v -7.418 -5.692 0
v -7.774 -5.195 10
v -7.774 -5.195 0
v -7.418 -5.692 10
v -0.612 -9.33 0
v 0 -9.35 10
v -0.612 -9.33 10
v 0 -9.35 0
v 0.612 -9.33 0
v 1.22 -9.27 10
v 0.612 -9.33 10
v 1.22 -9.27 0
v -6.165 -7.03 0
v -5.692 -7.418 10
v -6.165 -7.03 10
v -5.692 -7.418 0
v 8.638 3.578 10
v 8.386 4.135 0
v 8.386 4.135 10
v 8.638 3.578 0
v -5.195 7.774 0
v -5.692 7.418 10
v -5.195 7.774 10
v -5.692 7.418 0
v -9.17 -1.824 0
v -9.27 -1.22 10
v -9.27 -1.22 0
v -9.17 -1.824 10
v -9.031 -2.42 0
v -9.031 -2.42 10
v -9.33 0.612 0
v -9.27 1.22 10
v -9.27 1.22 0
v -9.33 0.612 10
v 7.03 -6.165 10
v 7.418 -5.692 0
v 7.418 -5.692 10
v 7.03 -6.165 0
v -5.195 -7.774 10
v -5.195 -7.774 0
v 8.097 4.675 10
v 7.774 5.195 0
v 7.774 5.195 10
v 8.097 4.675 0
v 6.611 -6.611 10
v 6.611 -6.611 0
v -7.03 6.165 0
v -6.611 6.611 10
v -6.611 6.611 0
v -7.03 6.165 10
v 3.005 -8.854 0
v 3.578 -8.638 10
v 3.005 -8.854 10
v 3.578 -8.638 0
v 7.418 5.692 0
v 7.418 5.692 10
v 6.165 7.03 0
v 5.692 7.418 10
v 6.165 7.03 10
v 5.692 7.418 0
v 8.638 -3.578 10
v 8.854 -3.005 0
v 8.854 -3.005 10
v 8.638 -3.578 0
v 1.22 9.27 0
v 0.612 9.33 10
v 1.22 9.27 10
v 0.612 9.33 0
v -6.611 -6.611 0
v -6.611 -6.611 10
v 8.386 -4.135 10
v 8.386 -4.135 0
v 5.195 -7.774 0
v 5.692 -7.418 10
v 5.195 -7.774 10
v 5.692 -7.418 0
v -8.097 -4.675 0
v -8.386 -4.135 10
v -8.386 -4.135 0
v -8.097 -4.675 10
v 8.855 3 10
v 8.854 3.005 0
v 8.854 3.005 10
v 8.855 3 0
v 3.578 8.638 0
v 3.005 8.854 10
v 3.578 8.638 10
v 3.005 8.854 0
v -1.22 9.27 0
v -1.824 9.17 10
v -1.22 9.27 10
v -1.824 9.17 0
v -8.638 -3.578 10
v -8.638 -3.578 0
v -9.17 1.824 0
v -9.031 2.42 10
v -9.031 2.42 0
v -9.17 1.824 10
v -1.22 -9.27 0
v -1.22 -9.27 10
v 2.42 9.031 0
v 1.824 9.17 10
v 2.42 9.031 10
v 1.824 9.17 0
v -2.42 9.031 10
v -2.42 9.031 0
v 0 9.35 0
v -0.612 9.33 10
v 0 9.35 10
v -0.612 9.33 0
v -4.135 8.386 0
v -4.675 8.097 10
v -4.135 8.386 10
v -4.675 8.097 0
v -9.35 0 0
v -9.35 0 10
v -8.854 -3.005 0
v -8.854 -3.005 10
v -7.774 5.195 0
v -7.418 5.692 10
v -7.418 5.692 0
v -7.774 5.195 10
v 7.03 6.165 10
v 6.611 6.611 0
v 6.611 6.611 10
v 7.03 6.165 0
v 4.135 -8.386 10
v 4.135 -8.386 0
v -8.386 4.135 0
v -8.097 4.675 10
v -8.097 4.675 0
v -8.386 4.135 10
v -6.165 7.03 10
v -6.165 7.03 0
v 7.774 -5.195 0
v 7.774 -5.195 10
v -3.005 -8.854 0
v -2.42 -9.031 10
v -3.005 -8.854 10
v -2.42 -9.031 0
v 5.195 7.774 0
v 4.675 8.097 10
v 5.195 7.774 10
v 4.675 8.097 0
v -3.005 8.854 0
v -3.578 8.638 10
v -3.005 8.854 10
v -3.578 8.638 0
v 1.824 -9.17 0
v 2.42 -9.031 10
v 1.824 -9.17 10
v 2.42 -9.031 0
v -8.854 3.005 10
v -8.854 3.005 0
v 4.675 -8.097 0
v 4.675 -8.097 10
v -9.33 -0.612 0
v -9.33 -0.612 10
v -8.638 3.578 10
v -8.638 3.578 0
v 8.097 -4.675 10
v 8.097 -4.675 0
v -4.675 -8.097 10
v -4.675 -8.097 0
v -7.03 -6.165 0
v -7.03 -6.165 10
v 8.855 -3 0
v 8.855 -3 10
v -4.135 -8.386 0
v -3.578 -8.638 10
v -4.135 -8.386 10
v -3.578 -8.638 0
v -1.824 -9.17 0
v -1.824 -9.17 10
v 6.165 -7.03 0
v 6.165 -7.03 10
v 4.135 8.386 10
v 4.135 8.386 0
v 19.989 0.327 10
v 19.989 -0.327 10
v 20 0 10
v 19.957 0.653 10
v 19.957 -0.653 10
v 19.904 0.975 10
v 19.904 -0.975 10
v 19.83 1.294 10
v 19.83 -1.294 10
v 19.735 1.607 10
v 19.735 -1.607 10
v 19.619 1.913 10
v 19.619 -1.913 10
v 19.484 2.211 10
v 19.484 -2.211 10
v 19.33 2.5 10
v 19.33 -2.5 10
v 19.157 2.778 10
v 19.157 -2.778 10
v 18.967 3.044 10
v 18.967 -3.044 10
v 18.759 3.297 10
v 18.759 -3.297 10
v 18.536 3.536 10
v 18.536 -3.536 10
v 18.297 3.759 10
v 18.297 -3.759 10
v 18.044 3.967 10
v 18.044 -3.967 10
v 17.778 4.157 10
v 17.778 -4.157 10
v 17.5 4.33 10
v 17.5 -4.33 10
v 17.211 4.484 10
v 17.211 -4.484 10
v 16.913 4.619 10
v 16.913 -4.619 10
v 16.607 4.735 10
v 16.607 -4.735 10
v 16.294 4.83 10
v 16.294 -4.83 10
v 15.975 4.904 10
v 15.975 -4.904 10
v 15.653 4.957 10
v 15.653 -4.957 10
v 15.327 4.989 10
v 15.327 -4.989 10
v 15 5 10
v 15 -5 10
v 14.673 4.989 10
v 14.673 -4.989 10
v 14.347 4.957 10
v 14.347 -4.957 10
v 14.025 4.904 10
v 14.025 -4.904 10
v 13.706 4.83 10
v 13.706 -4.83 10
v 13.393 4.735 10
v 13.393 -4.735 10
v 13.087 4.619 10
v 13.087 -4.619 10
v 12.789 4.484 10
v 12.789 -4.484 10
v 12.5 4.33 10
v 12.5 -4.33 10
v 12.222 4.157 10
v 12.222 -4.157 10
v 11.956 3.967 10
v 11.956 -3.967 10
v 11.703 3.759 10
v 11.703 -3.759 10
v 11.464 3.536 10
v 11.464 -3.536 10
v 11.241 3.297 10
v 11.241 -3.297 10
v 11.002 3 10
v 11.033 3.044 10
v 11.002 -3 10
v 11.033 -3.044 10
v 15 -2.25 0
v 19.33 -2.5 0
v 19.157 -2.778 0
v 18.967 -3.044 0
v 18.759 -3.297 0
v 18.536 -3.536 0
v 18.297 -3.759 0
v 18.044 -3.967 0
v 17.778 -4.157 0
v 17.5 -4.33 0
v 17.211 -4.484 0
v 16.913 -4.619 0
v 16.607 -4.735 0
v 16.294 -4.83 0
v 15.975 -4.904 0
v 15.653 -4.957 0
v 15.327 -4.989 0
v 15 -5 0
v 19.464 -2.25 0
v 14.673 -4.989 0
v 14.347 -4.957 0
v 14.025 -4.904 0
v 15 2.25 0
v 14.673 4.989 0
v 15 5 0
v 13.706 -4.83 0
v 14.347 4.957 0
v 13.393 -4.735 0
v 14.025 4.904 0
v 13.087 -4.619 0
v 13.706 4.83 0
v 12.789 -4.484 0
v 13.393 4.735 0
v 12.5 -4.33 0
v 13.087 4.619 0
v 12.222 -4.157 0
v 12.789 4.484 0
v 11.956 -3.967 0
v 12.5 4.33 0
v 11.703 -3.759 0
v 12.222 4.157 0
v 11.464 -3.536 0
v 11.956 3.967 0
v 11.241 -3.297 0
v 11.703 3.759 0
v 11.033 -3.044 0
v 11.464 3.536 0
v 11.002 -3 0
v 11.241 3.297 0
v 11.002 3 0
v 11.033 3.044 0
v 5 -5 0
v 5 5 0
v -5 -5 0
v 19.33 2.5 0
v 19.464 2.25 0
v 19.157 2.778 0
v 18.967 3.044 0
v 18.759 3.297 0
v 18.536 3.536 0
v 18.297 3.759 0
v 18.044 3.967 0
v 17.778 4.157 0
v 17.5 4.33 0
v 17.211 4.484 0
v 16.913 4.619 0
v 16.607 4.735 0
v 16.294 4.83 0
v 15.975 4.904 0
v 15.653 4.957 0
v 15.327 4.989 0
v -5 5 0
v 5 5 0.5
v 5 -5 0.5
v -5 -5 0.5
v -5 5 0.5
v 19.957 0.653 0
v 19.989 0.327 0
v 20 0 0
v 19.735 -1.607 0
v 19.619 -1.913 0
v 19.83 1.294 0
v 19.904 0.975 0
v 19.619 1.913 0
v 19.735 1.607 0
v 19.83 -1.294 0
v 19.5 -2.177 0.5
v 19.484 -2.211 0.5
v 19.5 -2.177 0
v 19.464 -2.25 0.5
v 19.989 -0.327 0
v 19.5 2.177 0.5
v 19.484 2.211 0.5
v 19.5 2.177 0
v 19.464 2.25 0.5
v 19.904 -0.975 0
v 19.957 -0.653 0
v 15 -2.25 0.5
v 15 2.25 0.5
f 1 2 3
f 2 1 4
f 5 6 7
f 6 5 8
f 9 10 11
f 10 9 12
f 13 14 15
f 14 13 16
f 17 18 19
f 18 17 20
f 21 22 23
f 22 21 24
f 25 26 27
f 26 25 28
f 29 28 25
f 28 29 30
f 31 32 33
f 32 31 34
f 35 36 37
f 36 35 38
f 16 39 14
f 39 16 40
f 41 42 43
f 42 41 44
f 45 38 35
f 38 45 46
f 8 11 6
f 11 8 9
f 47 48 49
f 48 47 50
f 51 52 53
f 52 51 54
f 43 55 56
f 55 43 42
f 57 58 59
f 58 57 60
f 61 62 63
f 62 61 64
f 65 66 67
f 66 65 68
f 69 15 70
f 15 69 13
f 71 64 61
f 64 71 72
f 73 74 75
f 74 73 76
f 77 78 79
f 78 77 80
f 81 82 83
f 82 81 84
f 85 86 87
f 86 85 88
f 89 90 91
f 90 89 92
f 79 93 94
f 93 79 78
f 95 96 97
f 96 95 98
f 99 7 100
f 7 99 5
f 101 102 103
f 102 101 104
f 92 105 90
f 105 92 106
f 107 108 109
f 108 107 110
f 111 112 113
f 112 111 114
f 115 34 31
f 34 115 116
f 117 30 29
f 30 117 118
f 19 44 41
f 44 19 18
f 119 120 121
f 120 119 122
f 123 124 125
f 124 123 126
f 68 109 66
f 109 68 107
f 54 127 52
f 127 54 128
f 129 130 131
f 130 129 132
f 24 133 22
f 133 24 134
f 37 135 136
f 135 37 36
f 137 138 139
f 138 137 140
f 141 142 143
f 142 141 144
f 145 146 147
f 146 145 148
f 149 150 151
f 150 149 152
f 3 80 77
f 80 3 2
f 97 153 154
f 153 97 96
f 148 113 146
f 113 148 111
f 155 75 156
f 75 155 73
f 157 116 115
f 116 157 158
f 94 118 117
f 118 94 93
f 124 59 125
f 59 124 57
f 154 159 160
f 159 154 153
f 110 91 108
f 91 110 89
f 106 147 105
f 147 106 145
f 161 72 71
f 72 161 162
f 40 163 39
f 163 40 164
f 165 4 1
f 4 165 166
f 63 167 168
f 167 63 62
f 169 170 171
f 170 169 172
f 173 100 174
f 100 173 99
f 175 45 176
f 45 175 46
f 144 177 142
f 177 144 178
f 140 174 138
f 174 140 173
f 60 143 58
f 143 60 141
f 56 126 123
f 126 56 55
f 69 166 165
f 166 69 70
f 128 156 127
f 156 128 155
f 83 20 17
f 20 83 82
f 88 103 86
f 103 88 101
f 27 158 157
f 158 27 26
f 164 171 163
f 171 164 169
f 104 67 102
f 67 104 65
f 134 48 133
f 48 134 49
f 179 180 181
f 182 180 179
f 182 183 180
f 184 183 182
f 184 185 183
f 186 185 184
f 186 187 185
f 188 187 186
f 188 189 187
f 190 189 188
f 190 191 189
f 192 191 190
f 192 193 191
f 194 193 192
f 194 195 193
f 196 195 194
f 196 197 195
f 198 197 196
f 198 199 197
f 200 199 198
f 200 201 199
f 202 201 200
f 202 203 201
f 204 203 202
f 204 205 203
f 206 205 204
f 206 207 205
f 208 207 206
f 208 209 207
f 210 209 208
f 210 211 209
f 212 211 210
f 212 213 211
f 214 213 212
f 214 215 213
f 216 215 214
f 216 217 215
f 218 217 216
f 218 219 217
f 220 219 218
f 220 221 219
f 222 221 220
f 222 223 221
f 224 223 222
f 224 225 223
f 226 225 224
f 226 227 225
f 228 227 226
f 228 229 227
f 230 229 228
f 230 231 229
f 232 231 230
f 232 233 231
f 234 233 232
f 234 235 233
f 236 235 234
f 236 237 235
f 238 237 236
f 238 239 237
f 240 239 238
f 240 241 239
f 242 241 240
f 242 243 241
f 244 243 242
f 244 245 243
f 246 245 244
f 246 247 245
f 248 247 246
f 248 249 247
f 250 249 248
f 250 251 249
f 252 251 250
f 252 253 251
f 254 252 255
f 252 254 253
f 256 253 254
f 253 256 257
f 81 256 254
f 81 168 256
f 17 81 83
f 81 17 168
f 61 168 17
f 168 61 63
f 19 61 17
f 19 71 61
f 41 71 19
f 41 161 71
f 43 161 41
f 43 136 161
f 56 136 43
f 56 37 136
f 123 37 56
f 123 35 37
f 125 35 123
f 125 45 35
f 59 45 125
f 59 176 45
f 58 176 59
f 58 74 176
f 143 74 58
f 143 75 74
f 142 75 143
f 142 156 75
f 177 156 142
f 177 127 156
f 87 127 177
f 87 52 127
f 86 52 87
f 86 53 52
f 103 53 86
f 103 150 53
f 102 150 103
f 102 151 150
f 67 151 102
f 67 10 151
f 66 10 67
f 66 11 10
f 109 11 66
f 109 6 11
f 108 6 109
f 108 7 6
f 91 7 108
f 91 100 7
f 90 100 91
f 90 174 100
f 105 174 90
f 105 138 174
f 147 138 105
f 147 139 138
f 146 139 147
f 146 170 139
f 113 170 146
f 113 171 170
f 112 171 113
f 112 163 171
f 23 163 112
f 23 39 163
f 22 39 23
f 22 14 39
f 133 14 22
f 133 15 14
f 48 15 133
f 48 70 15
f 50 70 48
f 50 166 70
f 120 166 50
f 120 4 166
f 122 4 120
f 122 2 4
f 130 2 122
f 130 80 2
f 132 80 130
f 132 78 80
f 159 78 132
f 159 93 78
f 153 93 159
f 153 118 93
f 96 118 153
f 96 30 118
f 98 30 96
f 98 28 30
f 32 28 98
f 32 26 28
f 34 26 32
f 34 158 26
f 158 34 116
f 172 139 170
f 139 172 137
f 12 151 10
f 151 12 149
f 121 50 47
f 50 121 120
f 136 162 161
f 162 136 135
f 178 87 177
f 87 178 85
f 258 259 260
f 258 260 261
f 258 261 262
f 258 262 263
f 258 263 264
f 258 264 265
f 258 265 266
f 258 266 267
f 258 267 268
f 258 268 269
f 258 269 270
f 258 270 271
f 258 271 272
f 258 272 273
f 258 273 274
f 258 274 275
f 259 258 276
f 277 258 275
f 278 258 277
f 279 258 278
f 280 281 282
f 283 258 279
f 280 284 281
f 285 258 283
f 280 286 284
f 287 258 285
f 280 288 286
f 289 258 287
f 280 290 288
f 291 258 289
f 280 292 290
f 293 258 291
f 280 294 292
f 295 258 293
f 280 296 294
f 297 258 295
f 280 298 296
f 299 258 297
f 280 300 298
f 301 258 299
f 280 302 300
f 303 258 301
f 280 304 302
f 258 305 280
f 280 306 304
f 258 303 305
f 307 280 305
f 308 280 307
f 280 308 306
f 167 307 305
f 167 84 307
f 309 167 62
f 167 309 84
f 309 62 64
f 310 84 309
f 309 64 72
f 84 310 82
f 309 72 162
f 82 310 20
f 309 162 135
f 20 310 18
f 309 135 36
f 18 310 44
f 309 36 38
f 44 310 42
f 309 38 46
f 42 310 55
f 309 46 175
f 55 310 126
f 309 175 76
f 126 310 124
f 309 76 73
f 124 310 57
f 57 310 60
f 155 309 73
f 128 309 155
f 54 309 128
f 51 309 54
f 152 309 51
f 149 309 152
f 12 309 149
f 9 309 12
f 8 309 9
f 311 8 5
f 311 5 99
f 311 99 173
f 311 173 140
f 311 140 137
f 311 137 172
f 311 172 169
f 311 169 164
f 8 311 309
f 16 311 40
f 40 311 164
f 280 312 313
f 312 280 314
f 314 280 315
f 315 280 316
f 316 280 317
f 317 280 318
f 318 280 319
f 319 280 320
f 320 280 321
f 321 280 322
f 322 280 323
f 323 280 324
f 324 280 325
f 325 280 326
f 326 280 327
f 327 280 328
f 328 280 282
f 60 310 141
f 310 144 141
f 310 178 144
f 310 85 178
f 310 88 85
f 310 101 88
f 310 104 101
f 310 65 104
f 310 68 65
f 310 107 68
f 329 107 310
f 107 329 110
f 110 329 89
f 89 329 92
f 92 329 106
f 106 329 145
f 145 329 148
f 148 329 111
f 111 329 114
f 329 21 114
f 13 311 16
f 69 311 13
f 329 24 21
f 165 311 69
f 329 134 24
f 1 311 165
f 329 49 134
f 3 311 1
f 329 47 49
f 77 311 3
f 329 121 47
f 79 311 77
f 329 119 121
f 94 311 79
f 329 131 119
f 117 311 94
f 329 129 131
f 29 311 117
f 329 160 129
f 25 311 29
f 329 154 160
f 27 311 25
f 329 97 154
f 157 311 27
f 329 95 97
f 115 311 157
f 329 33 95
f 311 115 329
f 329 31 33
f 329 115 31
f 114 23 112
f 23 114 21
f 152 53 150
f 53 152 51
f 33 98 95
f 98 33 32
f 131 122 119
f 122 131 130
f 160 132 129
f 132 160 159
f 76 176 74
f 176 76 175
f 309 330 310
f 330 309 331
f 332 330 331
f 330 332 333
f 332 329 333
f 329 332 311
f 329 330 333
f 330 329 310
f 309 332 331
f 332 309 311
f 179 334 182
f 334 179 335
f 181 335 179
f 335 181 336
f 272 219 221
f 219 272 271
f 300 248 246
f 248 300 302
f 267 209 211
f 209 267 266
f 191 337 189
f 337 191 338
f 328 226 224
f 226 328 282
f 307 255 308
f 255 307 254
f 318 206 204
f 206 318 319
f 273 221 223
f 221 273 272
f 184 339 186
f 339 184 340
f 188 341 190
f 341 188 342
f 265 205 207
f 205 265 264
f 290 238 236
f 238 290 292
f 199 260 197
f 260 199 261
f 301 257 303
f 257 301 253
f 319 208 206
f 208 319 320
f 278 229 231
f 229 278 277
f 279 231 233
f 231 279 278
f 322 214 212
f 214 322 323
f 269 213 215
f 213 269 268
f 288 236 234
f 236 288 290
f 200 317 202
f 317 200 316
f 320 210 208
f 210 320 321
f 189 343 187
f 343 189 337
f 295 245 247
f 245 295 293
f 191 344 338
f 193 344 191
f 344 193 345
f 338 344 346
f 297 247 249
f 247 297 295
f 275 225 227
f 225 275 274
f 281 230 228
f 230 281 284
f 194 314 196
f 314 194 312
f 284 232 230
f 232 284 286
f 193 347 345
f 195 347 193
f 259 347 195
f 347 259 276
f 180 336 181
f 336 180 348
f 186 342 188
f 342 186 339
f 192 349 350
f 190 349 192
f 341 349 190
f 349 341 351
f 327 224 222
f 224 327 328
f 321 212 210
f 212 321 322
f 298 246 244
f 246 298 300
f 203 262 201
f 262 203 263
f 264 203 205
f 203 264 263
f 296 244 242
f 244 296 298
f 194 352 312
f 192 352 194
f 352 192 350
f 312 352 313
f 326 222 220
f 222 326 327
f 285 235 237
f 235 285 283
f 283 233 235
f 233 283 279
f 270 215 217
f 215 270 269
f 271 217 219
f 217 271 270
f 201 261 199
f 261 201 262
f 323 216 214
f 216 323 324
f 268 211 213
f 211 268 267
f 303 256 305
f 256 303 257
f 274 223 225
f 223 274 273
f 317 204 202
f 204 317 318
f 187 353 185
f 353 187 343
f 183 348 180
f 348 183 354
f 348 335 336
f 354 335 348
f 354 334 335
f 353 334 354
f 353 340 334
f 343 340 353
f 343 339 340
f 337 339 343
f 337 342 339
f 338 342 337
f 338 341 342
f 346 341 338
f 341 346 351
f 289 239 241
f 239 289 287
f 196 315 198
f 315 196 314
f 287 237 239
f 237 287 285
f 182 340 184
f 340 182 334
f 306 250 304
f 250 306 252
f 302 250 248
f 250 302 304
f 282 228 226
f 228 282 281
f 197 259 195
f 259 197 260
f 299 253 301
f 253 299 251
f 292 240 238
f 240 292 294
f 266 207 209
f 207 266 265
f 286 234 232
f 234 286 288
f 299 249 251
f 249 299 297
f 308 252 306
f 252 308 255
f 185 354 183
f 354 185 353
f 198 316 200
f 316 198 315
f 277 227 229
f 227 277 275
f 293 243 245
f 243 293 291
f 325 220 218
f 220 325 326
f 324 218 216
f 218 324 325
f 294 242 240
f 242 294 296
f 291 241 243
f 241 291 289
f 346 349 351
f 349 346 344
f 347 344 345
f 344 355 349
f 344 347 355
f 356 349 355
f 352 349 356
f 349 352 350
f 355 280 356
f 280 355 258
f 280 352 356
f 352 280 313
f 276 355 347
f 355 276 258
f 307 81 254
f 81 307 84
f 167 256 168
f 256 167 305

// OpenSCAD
// Snap-on tubing clip for 12.7 mm lab stand rod
// Print orientation: flat on bed, extrusion along +Z

// ---------- Parameters ----------
stand_d      = 12.7;   // stand rod diameter
stand_wall   = 3;      // stand ring wall thickness
stand_open   = 10;     // stand ring opening width (along -X)
tube_d       = 6;      // tubing inner diameter
tube_wall    = 2;      // tubing wall thickness
tube_open    = 4.5;    // tubing opening width (along +X)
bridge_w     = 6;      // bridge width (Y)
bridge_x0    = 8;      // bridge start (X)
bridge_x1    = 12;     // bridge end (X)
eps          = 0.5;    // cutter overshoot

$fn = 96;

// ---------- Derived ----------
stand_od = stand_d + 2 * stand_wall;   // 18.7
tube_od  = tube_d + 2 * tube_wall;     // 10

// ---------- Model ----------
union() {
    // Stand ring
    difference() {
        cylinder(d = stand_od, h = 10);
        translate([-stand_open / 2, -stand_open / 2, -eps])
            cube([stand_open, stand_open, 2 * eps]);
    }

    // Tubing ring
    translate([15, 0, 0])
        difference() {
            cylinder(d = tube_od, h = 10);
            translate([0, -tube_open / 2, -eps])
                cube([tube_open, tube_open, 2 * eps]);
        }

    // Bridge
    translate([bridge_x0, -bridge_w / 2, 0])
        cube([bridge_x1 - bridge_x0, bridge_w, 10]);
}
